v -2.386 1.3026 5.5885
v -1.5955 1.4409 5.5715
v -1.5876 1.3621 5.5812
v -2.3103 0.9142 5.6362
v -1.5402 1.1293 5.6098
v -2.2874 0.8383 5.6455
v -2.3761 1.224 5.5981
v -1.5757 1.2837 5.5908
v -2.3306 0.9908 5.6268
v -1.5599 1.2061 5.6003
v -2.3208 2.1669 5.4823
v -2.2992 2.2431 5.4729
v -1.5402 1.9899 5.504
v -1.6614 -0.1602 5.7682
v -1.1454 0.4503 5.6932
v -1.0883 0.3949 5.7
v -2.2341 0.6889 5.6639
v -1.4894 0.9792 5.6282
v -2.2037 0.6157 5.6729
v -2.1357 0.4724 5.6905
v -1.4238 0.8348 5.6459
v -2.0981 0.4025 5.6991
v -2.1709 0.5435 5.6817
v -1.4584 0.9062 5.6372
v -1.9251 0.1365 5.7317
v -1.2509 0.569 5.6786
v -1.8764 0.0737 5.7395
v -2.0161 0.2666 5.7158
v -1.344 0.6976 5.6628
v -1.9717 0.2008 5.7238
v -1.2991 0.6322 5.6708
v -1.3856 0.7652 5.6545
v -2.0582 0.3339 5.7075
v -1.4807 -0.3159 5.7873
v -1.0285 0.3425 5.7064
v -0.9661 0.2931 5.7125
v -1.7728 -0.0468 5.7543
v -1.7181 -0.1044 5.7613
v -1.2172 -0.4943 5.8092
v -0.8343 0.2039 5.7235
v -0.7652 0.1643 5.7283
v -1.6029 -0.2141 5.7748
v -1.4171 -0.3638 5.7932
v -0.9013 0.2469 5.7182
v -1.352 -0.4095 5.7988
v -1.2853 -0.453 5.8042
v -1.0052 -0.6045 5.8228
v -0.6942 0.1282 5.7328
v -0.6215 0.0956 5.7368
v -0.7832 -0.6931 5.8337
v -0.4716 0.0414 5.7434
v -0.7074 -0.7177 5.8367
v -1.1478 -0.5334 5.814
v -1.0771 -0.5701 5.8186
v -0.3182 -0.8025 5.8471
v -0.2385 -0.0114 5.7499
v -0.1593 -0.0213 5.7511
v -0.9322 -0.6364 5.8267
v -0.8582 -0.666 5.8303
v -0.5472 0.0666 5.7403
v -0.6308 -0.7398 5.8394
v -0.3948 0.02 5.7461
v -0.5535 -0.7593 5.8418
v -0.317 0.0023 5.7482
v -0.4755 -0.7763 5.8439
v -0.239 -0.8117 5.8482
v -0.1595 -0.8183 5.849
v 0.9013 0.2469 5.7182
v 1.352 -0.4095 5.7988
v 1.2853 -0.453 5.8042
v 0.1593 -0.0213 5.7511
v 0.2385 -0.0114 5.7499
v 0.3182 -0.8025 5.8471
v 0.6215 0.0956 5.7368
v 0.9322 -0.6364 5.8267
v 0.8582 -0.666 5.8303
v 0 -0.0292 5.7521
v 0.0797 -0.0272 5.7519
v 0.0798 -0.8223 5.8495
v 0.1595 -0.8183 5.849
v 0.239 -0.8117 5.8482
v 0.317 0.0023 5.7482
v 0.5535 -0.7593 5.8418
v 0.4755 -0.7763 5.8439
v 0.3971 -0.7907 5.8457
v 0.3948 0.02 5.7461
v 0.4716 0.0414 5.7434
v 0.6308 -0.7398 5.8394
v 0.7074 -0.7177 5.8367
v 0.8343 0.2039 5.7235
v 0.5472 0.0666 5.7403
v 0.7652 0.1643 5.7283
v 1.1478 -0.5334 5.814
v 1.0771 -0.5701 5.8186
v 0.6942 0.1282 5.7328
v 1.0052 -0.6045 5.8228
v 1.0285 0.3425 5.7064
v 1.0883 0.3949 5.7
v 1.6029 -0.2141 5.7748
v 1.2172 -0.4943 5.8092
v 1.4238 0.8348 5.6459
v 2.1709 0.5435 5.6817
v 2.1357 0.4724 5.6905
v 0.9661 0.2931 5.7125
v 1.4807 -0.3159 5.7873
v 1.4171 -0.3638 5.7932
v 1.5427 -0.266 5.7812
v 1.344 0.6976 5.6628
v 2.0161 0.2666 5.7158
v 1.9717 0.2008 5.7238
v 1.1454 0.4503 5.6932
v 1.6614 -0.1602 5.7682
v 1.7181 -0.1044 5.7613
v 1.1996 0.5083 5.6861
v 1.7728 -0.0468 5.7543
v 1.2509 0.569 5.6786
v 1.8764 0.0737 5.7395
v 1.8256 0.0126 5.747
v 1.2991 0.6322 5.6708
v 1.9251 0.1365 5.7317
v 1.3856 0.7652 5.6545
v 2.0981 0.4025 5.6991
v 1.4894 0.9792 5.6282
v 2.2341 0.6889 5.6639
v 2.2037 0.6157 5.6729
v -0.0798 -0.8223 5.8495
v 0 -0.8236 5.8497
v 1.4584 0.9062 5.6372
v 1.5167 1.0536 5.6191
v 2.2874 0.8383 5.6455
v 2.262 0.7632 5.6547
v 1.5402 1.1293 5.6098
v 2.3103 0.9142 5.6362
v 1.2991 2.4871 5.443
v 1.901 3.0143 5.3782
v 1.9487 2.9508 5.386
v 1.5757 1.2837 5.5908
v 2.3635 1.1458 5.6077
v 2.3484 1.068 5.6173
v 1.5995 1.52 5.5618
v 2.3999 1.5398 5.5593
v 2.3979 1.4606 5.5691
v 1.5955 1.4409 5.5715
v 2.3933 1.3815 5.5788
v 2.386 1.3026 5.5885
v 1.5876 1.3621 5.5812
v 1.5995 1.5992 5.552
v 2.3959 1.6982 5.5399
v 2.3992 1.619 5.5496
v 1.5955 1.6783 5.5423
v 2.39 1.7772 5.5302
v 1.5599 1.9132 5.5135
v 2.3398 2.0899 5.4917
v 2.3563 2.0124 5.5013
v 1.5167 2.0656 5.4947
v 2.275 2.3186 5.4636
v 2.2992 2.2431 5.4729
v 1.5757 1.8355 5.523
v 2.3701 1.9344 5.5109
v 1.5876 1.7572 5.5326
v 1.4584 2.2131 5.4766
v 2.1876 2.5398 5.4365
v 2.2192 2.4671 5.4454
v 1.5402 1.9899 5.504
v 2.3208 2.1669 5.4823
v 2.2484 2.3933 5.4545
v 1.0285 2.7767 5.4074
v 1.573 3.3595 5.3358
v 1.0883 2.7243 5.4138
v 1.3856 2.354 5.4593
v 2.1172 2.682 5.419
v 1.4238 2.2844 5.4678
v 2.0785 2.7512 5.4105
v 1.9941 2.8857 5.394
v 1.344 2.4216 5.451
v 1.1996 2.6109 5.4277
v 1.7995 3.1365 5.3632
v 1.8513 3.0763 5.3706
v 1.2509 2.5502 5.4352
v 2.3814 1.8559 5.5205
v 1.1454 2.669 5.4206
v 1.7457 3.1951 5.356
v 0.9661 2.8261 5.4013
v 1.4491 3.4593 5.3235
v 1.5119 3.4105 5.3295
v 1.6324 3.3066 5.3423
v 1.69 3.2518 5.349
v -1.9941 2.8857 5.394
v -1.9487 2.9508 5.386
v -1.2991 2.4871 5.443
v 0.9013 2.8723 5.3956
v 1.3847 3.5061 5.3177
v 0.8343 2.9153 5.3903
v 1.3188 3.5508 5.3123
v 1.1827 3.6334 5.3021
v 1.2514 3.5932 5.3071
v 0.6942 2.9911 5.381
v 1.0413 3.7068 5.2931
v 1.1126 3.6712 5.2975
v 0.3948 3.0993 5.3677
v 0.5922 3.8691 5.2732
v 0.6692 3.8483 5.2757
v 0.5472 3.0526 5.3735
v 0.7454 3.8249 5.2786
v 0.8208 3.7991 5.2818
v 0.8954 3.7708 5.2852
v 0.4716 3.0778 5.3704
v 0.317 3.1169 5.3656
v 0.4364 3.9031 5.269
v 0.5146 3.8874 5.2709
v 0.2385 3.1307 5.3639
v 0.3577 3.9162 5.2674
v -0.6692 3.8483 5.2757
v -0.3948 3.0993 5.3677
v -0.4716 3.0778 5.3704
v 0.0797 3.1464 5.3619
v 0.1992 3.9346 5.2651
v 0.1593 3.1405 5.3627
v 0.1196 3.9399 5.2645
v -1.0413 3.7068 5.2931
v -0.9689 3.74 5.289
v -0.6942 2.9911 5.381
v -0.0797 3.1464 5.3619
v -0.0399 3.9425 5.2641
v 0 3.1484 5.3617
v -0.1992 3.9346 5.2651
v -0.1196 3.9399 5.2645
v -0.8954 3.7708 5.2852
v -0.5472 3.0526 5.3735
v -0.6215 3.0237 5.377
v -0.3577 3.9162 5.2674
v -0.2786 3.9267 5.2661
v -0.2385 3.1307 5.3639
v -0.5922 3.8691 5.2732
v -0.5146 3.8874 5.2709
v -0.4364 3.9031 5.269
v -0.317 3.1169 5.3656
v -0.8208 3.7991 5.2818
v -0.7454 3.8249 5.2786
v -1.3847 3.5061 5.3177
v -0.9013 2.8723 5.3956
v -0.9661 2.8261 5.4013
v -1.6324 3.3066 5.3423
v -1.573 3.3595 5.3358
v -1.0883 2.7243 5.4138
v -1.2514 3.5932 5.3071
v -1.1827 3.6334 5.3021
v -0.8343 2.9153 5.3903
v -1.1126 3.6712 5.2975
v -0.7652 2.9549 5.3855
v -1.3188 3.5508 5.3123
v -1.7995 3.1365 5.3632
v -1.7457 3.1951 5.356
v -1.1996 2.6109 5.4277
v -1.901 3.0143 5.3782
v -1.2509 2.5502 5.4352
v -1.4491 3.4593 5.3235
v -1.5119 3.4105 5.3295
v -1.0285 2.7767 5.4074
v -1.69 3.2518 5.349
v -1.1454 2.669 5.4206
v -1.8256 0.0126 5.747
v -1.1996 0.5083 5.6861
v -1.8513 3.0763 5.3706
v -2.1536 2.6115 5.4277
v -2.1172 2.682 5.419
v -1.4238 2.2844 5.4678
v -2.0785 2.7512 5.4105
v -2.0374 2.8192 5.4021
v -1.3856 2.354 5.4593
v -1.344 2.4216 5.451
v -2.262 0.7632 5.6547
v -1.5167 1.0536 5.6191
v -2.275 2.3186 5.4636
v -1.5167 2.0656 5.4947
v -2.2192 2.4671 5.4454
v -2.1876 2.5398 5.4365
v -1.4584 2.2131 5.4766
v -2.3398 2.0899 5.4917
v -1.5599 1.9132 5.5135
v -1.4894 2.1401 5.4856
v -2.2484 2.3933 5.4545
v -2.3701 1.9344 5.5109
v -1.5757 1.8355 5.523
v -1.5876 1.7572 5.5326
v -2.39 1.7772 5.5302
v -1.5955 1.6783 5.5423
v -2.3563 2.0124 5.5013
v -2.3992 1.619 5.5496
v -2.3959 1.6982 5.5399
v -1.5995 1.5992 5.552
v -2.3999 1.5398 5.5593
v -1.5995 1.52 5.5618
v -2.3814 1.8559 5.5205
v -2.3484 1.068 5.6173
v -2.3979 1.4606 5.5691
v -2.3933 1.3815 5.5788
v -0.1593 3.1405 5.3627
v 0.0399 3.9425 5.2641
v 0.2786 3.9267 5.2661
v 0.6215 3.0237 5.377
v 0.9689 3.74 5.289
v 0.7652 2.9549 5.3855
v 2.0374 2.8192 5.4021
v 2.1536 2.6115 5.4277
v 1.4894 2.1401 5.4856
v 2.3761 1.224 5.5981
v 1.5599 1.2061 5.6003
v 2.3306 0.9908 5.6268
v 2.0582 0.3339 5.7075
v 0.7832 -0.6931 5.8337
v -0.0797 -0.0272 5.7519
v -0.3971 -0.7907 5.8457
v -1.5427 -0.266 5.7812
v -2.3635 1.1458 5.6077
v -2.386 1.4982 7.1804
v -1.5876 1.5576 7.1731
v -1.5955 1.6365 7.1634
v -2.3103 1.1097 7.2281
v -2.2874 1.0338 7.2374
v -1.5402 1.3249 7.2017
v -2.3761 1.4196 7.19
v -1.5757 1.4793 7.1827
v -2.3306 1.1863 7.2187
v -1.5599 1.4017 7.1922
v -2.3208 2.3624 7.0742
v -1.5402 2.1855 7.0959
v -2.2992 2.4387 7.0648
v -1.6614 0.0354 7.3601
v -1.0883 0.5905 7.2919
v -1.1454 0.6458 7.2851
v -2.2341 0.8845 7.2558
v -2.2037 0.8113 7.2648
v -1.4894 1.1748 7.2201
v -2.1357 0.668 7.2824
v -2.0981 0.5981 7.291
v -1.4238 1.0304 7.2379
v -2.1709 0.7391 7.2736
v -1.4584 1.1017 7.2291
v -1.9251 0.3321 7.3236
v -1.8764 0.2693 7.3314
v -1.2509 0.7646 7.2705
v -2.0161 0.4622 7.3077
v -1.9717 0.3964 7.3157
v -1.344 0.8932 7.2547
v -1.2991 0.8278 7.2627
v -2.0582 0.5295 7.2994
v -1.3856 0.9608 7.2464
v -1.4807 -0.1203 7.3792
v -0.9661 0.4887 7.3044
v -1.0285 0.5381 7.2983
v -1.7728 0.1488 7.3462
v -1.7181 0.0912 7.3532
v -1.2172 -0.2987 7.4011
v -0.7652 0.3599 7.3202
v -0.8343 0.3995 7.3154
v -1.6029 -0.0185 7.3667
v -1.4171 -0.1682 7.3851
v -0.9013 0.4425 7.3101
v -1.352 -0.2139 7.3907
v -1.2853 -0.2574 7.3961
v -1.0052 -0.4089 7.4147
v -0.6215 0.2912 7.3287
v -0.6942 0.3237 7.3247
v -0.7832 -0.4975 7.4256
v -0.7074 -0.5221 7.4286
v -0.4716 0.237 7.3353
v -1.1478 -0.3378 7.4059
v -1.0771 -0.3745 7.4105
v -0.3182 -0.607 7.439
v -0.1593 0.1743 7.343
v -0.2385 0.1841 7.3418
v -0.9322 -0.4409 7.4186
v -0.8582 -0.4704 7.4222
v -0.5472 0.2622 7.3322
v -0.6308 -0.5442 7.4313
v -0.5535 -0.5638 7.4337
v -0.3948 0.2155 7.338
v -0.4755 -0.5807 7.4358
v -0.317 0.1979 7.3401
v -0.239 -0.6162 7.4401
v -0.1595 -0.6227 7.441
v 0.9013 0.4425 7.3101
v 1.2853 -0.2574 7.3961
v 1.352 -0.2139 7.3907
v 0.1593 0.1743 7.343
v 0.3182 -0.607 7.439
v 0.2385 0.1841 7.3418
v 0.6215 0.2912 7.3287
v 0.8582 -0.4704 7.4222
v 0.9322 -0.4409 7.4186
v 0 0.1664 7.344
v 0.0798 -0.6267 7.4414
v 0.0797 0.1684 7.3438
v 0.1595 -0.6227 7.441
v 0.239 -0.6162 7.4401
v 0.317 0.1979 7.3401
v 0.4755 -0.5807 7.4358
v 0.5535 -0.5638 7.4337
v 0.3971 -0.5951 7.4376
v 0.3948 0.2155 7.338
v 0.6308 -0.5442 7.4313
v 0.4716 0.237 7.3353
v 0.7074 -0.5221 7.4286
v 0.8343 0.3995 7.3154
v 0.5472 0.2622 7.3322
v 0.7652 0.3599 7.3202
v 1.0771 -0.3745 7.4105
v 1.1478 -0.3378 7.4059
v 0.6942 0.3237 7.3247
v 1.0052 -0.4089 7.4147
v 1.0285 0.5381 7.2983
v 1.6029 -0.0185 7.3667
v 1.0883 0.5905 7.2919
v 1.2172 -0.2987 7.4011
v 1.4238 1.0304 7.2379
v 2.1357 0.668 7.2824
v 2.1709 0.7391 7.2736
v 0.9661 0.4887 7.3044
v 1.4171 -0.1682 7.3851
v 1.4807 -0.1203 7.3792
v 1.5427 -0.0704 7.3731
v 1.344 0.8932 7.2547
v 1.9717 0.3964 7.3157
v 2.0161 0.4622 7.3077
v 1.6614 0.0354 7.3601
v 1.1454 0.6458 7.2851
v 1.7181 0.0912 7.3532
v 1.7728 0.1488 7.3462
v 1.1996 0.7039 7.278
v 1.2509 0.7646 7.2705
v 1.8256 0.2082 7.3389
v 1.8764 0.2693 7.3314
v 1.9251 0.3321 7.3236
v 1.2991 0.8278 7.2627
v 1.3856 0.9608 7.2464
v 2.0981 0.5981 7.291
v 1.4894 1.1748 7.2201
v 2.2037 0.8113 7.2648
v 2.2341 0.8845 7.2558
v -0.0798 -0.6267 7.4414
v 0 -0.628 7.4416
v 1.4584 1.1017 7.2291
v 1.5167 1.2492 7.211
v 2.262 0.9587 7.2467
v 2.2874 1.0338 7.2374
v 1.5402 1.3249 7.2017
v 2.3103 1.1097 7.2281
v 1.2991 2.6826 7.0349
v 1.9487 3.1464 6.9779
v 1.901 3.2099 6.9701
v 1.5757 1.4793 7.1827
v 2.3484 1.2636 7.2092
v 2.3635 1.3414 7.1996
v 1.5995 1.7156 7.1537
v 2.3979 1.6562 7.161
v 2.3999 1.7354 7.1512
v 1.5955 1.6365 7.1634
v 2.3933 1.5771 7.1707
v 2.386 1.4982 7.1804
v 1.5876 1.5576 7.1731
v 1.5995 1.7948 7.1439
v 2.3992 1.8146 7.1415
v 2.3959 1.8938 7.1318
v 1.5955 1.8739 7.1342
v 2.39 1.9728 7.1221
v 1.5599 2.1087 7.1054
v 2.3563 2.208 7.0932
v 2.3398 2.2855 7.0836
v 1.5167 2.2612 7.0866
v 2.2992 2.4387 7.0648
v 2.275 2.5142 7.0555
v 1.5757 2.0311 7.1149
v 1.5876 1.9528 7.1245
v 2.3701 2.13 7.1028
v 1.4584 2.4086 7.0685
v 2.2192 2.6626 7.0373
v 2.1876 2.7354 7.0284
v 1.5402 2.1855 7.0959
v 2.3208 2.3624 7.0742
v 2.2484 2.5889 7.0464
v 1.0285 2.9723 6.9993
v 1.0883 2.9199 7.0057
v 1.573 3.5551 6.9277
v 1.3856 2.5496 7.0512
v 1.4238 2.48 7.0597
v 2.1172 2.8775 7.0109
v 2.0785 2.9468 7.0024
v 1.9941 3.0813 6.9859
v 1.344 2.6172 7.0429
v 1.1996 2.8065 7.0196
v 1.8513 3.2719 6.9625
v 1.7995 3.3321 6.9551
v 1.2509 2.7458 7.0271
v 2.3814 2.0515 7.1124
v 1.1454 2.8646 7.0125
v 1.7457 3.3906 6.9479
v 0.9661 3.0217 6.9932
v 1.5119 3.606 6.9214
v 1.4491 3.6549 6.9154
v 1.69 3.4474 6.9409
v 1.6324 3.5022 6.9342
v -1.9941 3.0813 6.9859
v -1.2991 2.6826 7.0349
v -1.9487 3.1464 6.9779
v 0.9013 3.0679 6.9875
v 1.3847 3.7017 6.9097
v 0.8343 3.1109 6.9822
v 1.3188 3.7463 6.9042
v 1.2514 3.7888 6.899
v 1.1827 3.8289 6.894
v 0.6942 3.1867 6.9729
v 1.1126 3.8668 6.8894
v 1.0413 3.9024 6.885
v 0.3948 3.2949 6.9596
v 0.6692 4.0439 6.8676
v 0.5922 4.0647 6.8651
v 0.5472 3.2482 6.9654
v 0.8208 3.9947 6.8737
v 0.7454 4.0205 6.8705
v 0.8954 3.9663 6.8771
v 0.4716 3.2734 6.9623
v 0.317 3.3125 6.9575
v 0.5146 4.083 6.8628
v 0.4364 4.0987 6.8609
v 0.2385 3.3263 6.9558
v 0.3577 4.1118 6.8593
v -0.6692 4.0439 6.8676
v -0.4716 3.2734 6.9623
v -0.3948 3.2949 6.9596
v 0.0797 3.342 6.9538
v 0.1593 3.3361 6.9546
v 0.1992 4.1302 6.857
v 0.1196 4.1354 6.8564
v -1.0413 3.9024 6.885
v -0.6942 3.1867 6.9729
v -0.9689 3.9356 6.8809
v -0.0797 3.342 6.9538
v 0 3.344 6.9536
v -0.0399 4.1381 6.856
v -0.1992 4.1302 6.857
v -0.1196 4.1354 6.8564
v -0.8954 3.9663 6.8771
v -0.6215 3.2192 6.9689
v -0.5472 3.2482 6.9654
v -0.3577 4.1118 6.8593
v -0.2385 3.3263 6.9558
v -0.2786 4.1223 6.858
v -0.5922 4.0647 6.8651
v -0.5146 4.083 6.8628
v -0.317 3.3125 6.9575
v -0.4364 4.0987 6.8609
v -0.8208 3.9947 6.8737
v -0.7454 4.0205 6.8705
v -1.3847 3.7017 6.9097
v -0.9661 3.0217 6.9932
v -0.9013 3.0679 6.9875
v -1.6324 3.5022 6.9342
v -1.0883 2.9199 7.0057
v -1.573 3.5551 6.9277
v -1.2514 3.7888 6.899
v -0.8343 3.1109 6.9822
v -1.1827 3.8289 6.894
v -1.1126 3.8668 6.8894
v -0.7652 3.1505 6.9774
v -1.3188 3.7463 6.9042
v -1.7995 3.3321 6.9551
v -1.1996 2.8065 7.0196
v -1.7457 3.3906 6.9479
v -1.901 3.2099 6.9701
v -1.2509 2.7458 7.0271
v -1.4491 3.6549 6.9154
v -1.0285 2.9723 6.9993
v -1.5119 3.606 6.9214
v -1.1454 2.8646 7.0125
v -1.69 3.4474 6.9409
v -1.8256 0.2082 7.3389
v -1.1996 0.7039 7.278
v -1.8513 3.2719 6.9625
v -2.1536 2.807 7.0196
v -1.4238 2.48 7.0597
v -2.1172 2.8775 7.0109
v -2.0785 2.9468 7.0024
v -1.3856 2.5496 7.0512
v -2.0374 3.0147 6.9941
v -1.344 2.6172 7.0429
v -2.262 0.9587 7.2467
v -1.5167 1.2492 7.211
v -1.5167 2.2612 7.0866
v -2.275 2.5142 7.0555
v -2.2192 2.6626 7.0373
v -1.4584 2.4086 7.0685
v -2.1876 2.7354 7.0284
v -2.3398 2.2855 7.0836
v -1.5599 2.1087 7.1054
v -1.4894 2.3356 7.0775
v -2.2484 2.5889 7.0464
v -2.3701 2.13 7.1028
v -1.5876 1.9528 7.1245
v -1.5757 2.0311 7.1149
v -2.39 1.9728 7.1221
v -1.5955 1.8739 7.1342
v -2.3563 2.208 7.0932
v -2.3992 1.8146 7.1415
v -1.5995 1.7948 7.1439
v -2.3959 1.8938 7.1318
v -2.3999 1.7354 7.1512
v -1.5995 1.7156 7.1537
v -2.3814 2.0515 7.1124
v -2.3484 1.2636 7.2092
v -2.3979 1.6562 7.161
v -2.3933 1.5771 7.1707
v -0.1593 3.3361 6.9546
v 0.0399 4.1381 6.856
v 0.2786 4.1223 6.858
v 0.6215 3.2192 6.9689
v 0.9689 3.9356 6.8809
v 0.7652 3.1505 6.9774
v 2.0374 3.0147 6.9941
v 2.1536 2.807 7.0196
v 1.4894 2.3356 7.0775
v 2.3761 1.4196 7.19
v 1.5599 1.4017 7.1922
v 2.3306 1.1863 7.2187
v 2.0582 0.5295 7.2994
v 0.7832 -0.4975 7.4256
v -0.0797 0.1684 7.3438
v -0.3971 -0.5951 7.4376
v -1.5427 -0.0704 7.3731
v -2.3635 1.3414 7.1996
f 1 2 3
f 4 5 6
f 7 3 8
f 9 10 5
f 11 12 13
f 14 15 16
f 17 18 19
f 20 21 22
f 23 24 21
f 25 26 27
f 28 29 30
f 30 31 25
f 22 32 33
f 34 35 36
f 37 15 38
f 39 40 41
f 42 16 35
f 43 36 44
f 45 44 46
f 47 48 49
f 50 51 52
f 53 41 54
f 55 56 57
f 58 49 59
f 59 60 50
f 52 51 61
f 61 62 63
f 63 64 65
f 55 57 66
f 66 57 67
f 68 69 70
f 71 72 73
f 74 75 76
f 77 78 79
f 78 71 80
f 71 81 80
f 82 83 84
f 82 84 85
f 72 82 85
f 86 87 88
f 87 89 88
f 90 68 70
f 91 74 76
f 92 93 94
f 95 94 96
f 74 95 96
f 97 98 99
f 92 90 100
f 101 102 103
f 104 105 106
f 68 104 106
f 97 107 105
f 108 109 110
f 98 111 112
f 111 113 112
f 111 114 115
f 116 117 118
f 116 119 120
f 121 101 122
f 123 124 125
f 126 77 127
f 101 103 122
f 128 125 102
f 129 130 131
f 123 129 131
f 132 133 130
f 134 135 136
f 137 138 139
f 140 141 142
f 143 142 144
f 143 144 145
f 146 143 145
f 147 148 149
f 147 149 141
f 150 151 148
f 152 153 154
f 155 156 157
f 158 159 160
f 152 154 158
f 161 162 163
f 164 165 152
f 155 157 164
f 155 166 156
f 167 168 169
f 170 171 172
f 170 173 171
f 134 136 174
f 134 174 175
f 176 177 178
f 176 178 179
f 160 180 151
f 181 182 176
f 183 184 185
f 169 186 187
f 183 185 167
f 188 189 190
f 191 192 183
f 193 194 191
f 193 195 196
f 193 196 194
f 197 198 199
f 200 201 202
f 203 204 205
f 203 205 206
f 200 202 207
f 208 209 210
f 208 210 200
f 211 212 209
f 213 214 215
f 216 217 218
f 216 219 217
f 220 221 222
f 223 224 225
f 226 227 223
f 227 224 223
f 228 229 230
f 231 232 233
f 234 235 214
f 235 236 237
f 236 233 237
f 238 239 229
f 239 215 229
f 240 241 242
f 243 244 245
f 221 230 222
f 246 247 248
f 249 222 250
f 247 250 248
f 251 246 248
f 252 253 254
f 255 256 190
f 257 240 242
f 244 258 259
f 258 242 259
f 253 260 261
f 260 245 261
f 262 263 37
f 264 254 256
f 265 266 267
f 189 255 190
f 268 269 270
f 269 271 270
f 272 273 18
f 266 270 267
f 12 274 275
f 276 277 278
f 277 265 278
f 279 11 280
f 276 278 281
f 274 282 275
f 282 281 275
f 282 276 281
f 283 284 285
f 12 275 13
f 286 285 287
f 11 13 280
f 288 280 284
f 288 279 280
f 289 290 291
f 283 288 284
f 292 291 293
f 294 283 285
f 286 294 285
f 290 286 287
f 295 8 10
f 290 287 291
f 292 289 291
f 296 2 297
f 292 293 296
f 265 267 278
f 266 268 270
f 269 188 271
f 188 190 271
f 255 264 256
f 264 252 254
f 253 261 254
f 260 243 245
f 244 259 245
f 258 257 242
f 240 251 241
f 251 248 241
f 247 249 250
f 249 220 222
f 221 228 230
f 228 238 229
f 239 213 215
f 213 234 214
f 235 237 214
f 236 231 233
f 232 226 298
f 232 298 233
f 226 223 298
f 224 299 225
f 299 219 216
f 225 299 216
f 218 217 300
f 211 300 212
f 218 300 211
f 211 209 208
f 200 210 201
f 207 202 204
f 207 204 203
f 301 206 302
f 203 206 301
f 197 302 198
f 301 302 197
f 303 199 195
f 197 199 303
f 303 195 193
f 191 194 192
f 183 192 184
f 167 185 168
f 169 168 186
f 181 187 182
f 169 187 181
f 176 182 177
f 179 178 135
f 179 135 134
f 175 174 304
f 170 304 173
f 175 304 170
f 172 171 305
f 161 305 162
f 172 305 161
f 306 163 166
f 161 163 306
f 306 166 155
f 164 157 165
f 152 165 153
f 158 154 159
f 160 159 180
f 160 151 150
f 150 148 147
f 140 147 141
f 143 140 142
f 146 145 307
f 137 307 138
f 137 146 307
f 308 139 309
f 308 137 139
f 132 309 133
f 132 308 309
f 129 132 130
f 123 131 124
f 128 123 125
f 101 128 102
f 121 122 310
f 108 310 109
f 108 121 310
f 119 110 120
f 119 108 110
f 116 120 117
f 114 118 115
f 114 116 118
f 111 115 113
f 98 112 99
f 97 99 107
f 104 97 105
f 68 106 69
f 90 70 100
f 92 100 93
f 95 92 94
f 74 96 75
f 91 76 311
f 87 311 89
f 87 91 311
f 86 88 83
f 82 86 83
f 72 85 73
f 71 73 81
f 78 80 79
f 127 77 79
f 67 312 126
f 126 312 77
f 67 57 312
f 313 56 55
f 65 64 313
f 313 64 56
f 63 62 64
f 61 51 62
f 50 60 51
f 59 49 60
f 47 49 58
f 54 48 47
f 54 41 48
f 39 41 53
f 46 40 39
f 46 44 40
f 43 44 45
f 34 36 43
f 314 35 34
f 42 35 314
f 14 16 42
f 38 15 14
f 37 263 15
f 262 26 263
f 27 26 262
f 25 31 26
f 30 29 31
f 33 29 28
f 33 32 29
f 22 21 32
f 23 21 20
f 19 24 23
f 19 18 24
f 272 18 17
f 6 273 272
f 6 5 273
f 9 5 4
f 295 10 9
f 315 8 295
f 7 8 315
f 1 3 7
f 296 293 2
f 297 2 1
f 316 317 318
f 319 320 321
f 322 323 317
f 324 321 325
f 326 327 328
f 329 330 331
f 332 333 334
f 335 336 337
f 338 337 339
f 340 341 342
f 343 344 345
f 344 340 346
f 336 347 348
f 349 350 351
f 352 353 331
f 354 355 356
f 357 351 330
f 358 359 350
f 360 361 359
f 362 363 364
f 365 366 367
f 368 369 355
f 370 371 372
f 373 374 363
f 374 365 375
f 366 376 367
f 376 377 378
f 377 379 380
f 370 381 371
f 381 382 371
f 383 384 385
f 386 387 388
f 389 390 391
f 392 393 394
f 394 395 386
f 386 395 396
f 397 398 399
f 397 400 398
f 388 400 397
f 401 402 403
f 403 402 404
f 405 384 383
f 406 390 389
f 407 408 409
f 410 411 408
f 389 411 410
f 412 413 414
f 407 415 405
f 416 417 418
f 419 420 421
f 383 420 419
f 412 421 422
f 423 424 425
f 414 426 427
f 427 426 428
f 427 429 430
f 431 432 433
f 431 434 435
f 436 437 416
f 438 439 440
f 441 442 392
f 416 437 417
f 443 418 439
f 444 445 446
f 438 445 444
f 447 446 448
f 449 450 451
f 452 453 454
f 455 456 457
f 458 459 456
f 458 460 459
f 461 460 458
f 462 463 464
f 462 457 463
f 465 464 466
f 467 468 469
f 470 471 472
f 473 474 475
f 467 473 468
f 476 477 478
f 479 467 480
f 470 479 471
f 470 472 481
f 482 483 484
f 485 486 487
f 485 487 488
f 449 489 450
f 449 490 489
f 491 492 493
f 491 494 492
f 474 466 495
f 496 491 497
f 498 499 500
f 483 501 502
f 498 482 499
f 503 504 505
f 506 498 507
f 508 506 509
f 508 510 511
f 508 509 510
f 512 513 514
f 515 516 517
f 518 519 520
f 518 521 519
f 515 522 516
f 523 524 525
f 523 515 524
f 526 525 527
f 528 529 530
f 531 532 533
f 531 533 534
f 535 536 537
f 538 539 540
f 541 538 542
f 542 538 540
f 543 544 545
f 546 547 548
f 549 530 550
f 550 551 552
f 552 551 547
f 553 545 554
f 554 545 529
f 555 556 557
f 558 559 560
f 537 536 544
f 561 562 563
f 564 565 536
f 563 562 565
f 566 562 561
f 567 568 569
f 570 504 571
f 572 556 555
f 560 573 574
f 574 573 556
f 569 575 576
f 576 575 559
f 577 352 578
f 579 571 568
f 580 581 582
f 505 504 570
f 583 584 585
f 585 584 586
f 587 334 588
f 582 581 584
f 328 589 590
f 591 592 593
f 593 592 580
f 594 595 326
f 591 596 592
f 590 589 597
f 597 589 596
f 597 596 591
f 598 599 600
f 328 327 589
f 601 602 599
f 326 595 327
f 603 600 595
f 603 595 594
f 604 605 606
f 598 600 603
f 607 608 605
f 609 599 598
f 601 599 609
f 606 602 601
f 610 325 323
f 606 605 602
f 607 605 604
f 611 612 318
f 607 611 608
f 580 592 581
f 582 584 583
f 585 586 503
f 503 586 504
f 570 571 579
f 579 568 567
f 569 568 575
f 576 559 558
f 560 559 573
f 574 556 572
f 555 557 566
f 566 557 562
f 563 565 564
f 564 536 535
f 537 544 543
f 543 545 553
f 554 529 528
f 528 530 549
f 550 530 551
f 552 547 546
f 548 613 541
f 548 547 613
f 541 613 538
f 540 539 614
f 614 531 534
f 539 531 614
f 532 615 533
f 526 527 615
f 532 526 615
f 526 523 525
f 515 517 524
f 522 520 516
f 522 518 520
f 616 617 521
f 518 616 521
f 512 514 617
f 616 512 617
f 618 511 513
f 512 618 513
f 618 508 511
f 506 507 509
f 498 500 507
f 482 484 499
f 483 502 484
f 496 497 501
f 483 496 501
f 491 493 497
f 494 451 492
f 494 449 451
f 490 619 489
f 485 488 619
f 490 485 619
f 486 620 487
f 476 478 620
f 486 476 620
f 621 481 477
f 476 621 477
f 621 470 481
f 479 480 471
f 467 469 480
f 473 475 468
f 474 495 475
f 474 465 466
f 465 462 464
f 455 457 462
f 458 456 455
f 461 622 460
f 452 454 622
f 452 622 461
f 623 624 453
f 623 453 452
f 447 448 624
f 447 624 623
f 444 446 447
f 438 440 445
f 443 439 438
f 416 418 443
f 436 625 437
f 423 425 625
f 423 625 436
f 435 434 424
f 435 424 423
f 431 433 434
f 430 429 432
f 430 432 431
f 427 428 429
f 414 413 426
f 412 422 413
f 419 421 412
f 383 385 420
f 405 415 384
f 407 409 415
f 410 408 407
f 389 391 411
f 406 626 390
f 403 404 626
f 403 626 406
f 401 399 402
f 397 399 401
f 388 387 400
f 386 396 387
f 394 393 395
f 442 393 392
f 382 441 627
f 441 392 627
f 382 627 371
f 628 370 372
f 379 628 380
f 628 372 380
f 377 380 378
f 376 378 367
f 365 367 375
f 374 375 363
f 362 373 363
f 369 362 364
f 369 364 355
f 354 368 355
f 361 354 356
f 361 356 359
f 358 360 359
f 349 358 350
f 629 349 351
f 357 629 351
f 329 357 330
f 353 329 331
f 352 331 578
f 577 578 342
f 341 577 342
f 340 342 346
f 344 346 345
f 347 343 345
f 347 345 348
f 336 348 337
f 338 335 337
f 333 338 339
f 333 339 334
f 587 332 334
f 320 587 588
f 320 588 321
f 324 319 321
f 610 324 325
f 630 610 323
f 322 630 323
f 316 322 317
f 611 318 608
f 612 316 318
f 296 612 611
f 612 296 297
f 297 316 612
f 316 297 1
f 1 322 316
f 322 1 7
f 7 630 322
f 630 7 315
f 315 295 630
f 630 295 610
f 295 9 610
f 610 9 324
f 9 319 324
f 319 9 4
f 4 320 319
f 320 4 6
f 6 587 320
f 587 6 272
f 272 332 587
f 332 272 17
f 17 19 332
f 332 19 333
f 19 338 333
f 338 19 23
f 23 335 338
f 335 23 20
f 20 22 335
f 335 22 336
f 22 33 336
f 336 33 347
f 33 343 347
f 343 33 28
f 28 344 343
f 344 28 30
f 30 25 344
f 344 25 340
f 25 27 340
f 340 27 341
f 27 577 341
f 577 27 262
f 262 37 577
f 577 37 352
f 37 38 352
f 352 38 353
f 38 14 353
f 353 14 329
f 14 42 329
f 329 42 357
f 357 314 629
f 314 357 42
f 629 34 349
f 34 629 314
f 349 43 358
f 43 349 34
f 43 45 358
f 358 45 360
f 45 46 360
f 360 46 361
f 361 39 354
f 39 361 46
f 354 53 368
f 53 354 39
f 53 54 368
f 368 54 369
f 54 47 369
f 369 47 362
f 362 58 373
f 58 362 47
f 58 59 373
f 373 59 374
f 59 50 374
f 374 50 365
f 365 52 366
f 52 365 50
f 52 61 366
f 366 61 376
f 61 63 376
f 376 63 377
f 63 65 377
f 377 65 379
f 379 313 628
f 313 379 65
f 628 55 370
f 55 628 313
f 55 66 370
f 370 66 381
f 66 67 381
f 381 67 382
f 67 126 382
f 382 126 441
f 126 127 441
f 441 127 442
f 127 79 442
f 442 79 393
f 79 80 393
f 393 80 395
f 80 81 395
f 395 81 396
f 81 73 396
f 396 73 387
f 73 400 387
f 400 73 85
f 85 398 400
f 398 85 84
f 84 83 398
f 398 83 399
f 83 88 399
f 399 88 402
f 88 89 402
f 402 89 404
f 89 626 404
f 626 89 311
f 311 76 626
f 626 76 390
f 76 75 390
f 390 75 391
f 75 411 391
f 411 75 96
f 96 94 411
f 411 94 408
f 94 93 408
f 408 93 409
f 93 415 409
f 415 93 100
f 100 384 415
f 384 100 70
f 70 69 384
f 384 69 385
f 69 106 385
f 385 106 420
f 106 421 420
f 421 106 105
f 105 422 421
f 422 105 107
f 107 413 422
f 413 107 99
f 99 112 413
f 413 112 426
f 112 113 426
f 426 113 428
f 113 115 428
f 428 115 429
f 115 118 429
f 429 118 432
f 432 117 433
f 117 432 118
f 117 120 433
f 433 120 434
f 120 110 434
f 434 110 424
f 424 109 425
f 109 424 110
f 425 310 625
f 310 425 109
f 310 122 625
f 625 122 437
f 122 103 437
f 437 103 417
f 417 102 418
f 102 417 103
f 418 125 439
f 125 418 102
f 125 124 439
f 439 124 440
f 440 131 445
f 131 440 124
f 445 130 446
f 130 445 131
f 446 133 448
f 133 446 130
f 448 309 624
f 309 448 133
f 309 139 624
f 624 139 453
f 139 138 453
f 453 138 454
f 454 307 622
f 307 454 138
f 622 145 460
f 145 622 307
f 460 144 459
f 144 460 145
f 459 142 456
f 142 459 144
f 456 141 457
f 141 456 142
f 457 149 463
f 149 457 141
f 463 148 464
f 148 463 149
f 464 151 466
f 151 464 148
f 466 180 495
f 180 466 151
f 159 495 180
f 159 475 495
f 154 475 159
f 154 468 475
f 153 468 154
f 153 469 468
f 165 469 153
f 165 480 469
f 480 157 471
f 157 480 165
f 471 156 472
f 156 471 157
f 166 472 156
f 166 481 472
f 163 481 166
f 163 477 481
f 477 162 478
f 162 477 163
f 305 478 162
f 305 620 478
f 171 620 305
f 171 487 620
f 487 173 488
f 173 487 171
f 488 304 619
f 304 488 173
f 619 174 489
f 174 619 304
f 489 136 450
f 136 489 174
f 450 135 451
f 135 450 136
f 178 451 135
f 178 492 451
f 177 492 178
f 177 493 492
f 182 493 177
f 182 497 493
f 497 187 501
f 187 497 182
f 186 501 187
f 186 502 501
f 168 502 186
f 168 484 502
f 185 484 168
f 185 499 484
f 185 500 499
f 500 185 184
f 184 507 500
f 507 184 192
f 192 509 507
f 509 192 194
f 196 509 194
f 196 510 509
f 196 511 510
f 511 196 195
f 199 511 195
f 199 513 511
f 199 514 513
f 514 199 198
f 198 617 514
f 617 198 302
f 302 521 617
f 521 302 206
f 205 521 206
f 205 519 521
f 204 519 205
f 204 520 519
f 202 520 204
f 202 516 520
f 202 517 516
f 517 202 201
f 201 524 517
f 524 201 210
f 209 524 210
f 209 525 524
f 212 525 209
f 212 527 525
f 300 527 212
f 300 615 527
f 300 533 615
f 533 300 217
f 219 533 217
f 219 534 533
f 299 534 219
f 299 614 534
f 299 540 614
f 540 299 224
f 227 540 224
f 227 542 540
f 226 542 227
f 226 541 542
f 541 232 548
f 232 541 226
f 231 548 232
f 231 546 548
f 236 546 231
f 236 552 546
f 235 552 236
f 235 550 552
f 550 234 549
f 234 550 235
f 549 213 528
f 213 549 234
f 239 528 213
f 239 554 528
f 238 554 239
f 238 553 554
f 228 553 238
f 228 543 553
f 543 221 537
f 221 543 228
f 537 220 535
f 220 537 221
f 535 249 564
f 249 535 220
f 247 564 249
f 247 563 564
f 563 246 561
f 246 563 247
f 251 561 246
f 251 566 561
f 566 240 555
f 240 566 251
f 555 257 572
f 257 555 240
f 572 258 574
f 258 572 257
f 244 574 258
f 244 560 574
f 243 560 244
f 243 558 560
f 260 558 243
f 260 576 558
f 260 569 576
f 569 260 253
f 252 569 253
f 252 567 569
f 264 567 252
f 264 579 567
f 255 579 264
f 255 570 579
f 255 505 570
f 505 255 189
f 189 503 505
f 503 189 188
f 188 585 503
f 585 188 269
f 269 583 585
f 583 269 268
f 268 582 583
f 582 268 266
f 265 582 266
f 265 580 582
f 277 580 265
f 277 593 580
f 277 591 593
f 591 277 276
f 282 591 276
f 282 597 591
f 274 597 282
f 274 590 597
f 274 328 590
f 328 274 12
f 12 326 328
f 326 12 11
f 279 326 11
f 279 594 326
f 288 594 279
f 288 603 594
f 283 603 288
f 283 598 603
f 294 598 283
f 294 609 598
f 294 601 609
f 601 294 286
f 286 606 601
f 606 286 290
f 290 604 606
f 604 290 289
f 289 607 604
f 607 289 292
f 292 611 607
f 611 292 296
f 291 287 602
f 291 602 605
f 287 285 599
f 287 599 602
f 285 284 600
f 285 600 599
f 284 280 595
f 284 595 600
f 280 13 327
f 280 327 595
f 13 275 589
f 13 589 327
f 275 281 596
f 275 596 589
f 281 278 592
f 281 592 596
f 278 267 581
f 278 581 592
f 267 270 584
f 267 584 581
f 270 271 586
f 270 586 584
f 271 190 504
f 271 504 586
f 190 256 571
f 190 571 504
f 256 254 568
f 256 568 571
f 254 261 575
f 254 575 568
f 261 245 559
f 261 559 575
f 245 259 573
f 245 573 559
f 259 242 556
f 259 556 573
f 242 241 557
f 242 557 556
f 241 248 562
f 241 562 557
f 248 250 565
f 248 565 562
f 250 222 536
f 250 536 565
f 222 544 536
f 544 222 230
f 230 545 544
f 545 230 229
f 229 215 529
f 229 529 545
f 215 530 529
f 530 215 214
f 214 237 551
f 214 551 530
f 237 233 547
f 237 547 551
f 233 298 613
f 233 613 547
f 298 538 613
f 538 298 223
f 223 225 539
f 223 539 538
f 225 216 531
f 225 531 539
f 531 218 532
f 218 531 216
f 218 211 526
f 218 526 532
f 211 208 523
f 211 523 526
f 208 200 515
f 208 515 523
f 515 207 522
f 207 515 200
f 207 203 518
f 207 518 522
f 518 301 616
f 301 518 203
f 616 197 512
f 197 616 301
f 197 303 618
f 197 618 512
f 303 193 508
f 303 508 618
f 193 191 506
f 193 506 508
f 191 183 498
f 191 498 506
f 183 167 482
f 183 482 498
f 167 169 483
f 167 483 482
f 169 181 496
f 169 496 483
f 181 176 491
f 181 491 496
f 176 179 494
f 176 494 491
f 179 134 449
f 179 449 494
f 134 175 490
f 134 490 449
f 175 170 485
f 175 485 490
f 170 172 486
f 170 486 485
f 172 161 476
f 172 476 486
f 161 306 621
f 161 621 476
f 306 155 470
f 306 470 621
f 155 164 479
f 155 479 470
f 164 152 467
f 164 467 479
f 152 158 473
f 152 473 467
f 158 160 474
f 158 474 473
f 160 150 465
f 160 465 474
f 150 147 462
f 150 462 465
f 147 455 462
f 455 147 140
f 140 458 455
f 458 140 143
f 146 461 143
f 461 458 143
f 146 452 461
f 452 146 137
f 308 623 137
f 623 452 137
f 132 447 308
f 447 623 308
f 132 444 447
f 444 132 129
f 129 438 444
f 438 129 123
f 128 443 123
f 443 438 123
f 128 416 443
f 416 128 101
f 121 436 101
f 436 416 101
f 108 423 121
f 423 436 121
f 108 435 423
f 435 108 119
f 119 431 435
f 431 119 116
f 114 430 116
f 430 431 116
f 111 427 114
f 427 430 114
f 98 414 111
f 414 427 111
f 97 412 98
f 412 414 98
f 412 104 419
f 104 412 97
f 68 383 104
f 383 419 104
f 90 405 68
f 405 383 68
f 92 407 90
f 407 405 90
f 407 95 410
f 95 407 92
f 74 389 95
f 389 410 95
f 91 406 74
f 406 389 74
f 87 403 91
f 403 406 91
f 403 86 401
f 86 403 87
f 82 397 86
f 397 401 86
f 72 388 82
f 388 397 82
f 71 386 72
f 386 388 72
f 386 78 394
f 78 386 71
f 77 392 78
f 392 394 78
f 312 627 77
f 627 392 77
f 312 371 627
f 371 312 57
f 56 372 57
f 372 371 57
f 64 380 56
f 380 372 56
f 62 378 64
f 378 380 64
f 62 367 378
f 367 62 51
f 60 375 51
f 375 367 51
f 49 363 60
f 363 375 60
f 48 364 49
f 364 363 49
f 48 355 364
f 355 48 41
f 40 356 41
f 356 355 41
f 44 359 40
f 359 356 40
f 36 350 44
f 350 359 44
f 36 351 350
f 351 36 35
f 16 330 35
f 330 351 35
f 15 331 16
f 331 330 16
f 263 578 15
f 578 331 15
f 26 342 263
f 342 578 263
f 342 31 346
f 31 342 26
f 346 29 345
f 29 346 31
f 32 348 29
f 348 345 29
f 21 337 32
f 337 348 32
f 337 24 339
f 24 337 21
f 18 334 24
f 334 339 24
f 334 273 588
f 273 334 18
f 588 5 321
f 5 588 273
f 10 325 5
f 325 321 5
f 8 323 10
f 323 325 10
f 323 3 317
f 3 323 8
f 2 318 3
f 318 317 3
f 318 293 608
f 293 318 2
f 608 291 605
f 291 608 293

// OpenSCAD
use <../lib.scad>
use <../p/4-4disc.scad>
use <s/30172s01.scad>
use <../p/stud2.scad>
$fa=1; $fs=0.2;
function ldraw_lib__30172(realsolid=false) = [
// 0 Minifig Hat Pith Helmet
// 0 Name: 30172.dat
// 0 Author: Philippe Hurbain [Philo]
// 0 !LDRAW_ORG Part UPDATE 2012-03
// 0 !LICENSE Licensed under CC BY 2.0 and CC BY 4.0 : see CAreadme.txt
// 
// 0 BFC CERTIFY CCW
  [0,"BFC","CERTIFY"],
  [0,"BFC","CCW"],
// 
// 0 !CATEGORY Minifig Headwear
// 
// 0 !HISTORY 2008-12-20 {LEGO Universe Team} Original part shape
// 0 !HISTORY 2009-01-07 [Philo] File preparation for LDraw Parts Tracker
// 0 !HISTORY 2012-12-28 [PTadmin] Official Update 2012-03
// 
// 
// 1 16 0 0 0 1 0 0 0 1 0 0 0 1 s\30172s01.dat
  [1,16,0,0,0,1,0,0,0,1,0,0,0,1, ldraw_lib__s__30172s01(realsolid)],
// 1 16 0 0 0 -1 0 0 0 1 0 0 0 1 s\30172s01.dat
  [1,16,0,0,0,-1,0,0,0,1,0,0,0,1, ldraw_lib__s__30172s01(realsolid)],
// 1 16 0 -13.9 3.9 1 0 0 0 0.993 0.122 0 -0.122 0.993 stud2.dat
  [1,16,0,-13.9,3.9,1,0,0,0,0.993,0.122,0,-0.122,0.993, ldraw_lib__stud2(realsolid)],
// 1 16 0 -13.9 3.9 4 0 0 0 3.97 0.487 0 -0.487 3.97 4-4disc.dat
  [1,16,0,-13.9,3.9,4,0,0,0,3.97,0.487,0,-0.487,3.97, ldraw_lib__4_4disc(realsolid)],
// 0 // Middle condlines
// 5 24 0 1.12 13.37 0 7.24 13.56 6.34 1.12 11.67 -6.34 1.12 11.67
  [5,24,0,1.12,13.37,0,7.24,13.56,6.34,1.12,11.67,-6.34,1.12,11.67],
// 5 24 0 -7.53 -8.26 0 -11.12 0.7 4.48 -7.53 -7.06 -4.48 -7.53 -7.06
  [5,24,0,-7.53,-8.26,0,-11.12,0.7,4.48,-7.53,-7.06,-4.48,-7.53,-7.06],
// 5 24 0 -11.12 0.7 0 -7.53 9.66 4.48 -7.53 8.46 -4.48 -7.53 8.46
  [5,24,0,-11.12,0.7,0,-7.53,9.66,4.48,-7.53,8.46,-4.48,-7.53,8.46],
// 5 24 0 1.12 -11.97 0 -7.53 -8.26 4.48 -7.53 -7.06 -6.34 1.12 -10.27
  [5,24,0,1.12,-11.97,0,-7.53,-8.26,4.48,-7.53,-7.06,-6.34,1.12,-10.27],
// 5 24 0 -7.53 9.66 0 1.12 13.37 6.34 1.12 11.67 -4.48 -7.53 8.46
  [5,24,0,-7.53,9.66,0,1.12,13.37,6.34,1.12,11.67,-4.48,-7.53,8.46],
// 5 24 0 5.73 -19.32 0 1.12 -11.97 10.07 6.3 -15.7 -10.07 6.3 -15.7
  [5,24,0,5.73,-19.32,0,1.12,-11.97,10.07,6.3,-15.7,-10.07,6.3,-15.7],
// 5 24 0 7.24 13.56 0 16.06 19.3 8.85 15.09 16.78 -8.85 15.09 16.78
  [5,24,0,7.24,13.56,0,16.06,19.3,8.85,15.09,16.78,-8.85,15.09,16.78],
// 5 24 0 16.06 19.3 0 16.3 19.91 4.99 15.98 19.08 -4.99 15.98 19.08
  [5,24,0,16.06,19.3,0,16.3,19.91,4.99,15.98,19.08,-4.99,15.98,19.08],
// 5 24 0 5.62 -20.09 0 5.73 -19.32 9.57 6.08 -17.04 -5 5.75 -19.21
  [5,24,0,5.62,-20.09,0,5.73,-19.32,9.57,6.08,-17.04,-5,5.75,-19.21],
// 5 24 0 16.3 19.91 0 15.92 20.59 5.14 15.59 19.74 -4.99 15.98 19.08
  [5,24,0,16.3,19.91,0,15.92,20.59,5.14,15.59,19.74,-4.99,15.98,19.08],
// 5 24 0 5.04 -20.51 0 5.62 -20.09 5 5.75 -19.21 -5.13 5.18 -19.61
  [5,24,0,5.04,-20.51,0,5.62,-20.09,5,5.75,-19.21,-5.13,5.18,-19.61],
// 5 24 0 15.92 20.59 0 15.06 20.7 5.14 15.59 19.74 -5.14 15.59 19.74
  [5,24,0,15.92,20.59,0,15.06,20.7,5.14,15.59,19.74,-5.14,15.59,19.74],
// 5 24 0 4.08 -20.31 0 5.04 -20.51 5.11 4.21 -19.4 -5.11 4.21 -19.4
  [5,24,0,4.08,-20.31,0,5.04,-20.51,5.11,4.21,-19.4,-5.11,4.21,-19.4],
// 5 24 0 15.06 20.7 0 10.67 18.61 4.48 10.43 17.84 -5.11 14.71 19.84
  [5,24,0,15.06,20.7,0,10.67,18.61,4.48,10.43,17.84,-5.11,14.71,19.84],
// 5 24 0 0.4 -14.89 0 1.76 -17.46 4.48 1.91 -16.66 -3.92 0.55 -14.23
  [5,24,0,0.4,-14.89,0,1.76,-17.46,4.48,1.91,-16.66,-3.92,0.55,-14.23],
// 5 24 0 1.76 -17.46 0 4.08 -20.31 5.11 4.21 -19.4 -4.48 1.91 -16.66
  [5,24,0,1.76,-17.46,0,4.08,-20.31,5.11,4.21,-19.4,-4.48,1.91,-16.66],
// 5 24 0 10.67 18.61 0 7.6 16.29 3.92 7.45 15.63 -4.48 10.43 17.84
  [5,24,0,10.67,18.61,0,7.6,16.29,3.92,7.45,15.63,-4.48,10.43,17.84],
// 5 24 0 -9.18 14.03 0 -13.01 9.95 1.39 -13.06 9.78 -2.57 -9.26 13.76
  [5,24,0,-9.18,14.03,0,-13.01,9.95,1.39,-13.06,9.78,-2.57,-9.26,13.76],
// 5 24 0 -3.84 16.02 0 -9.18 14.03 2.57 -9.26 13.76 -3.3 -3.94 15.64
  [5,24,0,-3.84,16.02,0,-9.18,14.03,2.57,-9.26,13.76,-3.3,-3.94,15.64],
// 5 24 0 1.86 16.59 0 -3.84 16.02 3.67 1.75 16.1 -3.67 1.75 16.1
  [5,24,0,1.86,16.59,0,-3.84,16.02,3.67,1.75,16.1,-3.67,1.75,16.1],
// 5 24 0 7.6 16.29 0 1.86 16.59 3.92 7.45 15.63 -3.92 7.45 15.63
  [5,24,0,7.6,16.29,0,1.86,16.59,3.92,7.45,15.63,-3.92,7.45,15.63],
// 5 24 0 -4.35 -12.93 0 0.4 -14.89 3.7 -4.23 -12.4 -3.7 -4.23 -12.4
  [5,24,0,-4.35,-12.93,0,0.4,-14.89,3.7,-4.23,-12.4,-3.7,-4.23,-12.4],
// 5 24 0 -8.76 -10.31 0 -4.35 -12.93 3.27 -8.67 -9.9 -3.27 -8.67 -9.9
  [5,24,0,-8.76,-10.31,0,-4.35,-12.93,3.27,-8.67,-9.9,-3.27,-8.67,-9.9],
// 5 24 0 -12.37 -6.7 0 -8.76 -10.31 3.27 -8.67 -9.9 -2.5 -12.31 -6.4
  [5,24,0,-12.37,-6.7,0,-8.76,-10.31,3.27,-8.67,-9.9,-2.5,-12.31,-6.4],
// 5 24 0 -14.66 -2.19 0 -12.37 -6.7 2.5 -12.31 -6.4 -1.4 -14.63 -2.01
  [5,24,0,-14.66,-2.19,0,-12.37,-6.7,2.5,-12.31,-6.4,-1.4,-14.63,-2.01],
// 5 24 0 -13.01 9.95 0 -13.17 9.86 1.39 -13.06 9.78 -1.39 -13.06 9.78
  [5,24,0,-13.01,9.95,0,-13.17,9.86,1.39,-13.06,9.78,-1.39,-13.06,9.78],
// 5 24 0 -14.63 -2.06 0 -14.66 -2.19 1.4 -14.63 -2.01 -1.4 -14.63 -2.01
  [5,24,0,-14.63,-2.06,0,-14.66,-2.19,1.4,-14.63,-2.01,-1.4,-14.63,-2.01],
// 0 //
];
module ldraw_lib__30172(step=0, col=false, unit=2/5, alt=false, line=0.2, solid=!$preview)
    makepoly(ldraw_lib__30172(solid), step=step, col=col, unit=unit, alt=alt, line=line, solid=solid);
ldraw_lib__30172(line=0.2);
